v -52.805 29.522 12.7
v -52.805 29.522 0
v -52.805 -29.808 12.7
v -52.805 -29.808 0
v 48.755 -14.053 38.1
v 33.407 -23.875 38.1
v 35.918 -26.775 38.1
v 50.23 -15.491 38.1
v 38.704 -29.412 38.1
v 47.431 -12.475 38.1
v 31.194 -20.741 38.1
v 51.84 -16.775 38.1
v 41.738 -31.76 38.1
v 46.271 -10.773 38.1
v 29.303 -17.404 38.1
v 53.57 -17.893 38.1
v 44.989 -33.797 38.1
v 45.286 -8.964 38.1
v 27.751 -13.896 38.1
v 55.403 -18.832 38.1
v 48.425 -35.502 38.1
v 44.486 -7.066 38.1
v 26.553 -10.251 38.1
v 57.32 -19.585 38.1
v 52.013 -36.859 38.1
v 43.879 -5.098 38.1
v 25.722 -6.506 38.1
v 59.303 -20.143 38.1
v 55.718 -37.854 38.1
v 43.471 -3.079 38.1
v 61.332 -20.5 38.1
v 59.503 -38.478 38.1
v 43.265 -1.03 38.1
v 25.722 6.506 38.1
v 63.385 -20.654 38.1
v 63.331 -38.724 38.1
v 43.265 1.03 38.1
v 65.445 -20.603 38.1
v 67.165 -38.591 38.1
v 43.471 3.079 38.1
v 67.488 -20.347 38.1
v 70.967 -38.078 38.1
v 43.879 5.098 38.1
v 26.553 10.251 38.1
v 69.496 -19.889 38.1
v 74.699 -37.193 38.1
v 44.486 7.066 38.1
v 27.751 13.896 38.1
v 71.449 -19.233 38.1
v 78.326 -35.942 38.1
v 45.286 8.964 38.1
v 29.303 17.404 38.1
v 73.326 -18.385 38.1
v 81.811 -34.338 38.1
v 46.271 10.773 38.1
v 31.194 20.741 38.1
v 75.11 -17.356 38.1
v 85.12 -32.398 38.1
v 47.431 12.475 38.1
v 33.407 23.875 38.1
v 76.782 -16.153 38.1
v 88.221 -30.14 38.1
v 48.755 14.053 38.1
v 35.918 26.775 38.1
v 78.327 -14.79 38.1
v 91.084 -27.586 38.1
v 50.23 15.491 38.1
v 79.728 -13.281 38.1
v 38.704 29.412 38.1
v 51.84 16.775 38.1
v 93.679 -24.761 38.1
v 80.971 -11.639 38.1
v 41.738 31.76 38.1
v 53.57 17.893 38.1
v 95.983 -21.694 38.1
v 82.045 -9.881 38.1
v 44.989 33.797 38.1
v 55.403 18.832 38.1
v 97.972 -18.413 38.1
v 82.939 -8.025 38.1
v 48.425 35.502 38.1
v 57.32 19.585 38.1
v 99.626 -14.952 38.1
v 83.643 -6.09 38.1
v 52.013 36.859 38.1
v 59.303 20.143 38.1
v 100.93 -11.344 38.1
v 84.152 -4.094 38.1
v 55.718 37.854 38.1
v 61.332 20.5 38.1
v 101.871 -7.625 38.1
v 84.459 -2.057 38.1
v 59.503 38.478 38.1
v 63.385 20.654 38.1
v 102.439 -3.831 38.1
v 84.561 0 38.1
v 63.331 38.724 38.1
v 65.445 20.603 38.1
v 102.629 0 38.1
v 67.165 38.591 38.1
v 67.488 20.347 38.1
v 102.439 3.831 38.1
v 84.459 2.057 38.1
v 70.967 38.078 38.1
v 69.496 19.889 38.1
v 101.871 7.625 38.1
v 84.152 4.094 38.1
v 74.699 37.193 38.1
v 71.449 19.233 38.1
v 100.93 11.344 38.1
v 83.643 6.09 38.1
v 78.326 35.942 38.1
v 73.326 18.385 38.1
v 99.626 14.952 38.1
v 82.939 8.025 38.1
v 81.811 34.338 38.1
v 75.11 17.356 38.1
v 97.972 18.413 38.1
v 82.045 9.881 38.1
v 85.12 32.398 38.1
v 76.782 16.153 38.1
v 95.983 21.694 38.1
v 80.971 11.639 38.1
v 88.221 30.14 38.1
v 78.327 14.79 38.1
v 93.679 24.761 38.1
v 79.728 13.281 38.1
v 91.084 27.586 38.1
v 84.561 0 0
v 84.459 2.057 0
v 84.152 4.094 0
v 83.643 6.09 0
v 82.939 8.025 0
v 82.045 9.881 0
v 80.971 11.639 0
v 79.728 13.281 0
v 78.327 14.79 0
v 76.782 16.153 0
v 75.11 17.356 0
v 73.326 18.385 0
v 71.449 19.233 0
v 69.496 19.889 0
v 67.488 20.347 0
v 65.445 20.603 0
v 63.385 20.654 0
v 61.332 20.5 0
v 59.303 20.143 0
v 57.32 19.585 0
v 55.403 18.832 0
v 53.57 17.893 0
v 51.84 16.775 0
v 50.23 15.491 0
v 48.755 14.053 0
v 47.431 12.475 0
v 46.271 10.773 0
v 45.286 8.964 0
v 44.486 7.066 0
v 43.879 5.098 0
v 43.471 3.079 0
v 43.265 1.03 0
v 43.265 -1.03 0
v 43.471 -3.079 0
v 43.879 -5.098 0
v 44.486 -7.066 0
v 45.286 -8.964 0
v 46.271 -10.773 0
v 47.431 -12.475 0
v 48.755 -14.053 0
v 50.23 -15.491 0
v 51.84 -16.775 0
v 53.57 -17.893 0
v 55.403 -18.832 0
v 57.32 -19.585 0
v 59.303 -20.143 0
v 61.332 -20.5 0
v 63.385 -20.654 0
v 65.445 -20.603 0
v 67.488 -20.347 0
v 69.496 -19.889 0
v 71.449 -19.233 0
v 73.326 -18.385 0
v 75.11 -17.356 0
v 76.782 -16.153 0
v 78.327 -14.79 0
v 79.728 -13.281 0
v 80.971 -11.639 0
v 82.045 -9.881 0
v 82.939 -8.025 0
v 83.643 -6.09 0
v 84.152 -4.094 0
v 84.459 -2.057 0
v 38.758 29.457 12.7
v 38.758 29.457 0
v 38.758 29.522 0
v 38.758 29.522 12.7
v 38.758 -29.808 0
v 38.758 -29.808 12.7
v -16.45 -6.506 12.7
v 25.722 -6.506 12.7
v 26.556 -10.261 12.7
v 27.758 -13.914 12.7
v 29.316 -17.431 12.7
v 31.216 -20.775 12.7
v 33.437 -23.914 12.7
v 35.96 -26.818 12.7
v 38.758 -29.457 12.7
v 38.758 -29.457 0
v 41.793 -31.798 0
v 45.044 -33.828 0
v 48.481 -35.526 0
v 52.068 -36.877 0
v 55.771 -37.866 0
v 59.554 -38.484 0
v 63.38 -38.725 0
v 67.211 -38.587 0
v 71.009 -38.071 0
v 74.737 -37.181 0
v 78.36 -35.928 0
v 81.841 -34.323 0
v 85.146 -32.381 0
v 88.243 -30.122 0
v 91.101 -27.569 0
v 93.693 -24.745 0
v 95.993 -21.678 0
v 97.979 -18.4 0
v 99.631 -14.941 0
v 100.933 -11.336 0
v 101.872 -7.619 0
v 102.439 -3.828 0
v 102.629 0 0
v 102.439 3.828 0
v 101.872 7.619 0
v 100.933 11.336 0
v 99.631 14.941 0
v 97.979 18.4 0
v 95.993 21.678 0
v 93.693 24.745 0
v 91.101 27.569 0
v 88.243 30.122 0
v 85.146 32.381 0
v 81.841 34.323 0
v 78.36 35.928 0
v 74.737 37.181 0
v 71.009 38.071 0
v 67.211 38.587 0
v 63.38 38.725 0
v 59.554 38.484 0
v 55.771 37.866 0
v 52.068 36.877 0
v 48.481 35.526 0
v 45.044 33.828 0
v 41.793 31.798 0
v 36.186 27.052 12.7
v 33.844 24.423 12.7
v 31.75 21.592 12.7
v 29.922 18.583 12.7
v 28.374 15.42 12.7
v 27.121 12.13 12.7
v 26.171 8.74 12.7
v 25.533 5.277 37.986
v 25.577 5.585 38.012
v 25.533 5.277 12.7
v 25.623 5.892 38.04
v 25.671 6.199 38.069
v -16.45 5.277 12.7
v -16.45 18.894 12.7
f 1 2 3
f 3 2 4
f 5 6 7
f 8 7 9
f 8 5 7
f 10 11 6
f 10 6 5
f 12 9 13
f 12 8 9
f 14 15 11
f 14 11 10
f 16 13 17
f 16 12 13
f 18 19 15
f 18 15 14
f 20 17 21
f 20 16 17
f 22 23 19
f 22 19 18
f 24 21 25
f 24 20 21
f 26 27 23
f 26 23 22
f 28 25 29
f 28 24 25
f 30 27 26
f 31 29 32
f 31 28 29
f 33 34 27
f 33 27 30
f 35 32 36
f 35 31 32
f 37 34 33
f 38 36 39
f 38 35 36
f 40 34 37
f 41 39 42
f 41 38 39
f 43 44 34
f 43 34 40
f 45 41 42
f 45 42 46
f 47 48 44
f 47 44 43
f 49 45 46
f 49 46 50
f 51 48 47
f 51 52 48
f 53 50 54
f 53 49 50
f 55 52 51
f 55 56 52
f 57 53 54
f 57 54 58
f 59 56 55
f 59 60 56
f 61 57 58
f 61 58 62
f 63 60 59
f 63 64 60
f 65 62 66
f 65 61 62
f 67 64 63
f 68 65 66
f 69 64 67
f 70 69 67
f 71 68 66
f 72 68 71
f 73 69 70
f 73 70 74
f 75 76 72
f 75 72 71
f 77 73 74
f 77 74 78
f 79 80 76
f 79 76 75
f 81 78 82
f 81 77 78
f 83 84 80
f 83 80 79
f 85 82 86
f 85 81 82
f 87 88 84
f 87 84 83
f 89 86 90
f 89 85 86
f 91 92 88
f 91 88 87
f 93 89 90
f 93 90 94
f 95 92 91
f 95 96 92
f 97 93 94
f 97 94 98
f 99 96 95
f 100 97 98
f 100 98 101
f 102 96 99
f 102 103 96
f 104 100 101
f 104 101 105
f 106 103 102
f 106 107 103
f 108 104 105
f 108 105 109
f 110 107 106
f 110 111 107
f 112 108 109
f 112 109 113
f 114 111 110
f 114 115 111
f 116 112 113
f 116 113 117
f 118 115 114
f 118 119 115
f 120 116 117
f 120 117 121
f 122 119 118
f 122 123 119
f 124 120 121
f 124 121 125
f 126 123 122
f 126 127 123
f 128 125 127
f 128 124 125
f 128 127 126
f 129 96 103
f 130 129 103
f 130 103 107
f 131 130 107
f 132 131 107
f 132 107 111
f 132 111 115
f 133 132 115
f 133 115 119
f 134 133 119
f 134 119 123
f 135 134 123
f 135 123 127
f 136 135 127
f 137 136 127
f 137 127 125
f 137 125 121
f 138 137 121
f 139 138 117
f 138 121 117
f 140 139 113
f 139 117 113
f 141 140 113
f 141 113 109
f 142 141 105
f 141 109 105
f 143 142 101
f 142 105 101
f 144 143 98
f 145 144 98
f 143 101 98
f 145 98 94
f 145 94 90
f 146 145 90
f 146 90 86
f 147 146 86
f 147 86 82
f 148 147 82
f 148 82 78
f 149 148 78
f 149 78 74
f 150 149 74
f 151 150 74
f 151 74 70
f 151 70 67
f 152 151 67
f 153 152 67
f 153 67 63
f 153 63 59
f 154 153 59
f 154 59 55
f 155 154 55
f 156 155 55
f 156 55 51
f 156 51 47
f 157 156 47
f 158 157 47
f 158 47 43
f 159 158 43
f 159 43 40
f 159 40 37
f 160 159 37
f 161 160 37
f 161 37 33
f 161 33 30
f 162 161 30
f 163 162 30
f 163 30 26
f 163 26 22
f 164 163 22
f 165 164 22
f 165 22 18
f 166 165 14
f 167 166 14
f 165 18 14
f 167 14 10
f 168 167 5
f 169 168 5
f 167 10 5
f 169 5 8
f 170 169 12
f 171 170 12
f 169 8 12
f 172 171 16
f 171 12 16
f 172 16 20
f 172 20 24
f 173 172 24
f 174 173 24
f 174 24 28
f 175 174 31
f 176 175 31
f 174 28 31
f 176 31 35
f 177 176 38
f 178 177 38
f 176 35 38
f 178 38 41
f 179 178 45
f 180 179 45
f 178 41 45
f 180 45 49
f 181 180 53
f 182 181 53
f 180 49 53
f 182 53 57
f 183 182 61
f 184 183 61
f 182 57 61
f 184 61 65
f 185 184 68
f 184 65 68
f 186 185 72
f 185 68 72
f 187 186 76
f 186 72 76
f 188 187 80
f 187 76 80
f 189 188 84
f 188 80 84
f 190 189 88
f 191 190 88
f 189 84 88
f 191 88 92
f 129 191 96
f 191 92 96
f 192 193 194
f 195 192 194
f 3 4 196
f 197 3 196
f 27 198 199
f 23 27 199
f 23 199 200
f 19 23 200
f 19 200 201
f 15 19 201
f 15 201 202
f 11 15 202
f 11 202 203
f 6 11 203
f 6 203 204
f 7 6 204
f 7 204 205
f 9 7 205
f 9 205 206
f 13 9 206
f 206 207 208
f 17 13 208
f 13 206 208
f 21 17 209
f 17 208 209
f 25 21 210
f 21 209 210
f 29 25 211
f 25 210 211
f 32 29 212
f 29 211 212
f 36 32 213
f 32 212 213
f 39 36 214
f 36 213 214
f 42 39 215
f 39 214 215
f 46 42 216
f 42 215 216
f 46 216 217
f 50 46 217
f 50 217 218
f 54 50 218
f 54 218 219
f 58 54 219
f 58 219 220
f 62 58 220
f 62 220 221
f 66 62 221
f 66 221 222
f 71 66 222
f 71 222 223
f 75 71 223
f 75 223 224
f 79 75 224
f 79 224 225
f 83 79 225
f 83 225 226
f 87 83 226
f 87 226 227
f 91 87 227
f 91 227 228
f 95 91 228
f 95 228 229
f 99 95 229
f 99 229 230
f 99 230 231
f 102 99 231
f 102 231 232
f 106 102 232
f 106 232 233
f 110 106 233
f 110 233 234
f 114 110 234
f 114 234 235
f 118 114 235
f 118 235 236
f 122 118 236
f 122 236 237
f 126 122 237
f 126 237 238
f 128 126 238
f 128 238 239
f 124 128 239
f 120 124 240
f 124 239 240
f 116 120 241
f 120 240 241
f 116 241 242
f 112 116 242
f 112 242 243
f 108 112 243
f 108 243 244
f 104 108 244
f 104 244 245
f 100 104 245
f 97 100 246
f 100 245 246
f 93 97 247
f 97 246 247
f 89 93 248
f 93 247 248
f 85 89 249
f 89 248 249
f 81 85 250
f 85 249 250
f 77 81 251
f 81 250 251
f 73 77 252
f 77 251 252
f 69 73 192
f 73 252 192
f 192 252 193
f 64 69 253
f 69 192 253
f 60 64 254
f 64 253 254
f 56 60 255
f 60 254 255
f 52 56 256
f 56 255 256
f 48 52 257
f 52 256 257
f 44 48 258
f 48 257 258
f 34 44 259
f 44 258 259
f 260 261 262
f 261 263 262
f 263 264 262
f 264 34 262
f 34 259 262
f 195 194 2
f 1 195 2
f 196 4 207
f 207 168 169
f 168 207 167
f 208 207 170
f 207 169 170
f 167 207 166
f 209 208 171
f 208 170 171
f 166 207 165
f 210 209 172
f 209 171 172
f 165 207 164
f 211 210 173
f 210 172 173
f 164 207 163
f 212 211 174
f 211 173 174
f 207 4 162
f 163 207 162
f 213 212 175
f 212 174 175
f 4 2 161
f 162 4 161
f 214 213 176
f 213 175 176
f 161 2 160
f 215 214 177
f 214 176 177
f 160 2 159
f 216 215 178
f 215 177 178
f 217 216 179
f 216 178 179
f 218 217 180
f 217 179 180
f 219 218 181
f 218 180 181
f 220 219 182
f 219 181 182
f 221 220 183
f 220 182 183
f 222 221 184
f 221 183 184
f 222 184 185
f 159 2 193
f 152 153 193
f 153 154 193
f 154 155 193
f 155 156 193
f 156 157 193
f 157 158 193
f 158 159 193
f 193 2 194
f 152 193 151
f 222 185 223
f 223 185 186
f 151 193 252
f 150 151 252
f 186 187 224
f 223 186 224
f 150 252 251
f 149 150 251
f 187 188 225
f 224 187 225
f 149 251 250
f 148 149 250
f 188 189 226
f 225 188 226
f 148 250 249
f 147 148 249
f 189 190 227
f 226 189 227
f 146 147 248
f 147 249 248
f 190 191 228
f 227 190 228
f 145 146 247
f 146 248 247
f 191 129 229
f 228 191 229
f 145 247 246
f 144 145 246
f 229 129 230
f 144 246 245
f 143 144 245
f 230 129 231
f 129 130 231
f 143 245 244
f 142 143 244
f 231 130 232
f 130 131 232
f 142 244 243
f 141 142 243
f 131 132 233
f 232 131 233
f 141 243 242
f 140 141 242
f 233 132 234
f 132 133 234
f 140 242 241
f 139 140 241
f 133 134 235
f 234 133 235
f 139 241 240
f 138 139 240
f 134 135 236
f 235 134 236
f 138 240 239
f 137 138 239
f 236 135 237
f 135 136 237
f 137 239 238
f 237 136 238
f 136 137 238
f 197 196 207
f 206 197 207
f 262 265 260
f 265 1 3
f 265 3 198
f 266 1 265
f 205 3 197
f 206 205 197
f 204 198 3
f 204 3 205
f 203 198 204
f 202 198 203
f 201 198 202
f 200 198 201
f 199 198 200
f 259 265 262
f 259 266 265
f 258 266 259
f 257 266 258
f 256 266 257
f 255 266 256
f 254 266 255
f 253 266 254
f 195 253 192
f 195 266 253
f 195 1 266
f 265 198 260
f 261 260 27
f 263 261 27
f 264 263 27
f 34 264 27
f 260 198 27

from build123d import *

# Parameters (mm, degrees)
F1_DEPTH = 12.7
F2_R     = 38.728544
F3_DEPTH = 38.1
F4_W     = 42.172854
F4_H     = 11.782876
F5_DEPTH = 25.4
F7_DEPTH = 25.4
F8_R     = 20.660809
F9_DEPTH = 50.8


with BuildPart() as f1:
    # F0 (on Top) → F1 (new body)
    with BuildSketch(Plane.XY):
        with BuildLine():
            Line((38.757574, 29.522406), (-52.804671, 29.522406))
            Line((-52.804671, 29.522406), (-52.804671, -29.807648))
            Line((-52.804671, -29.807648), (38.757574, -29.807648))
            Line((38.757574, -29.807648), (38.757574, -29.413341))
            ThreePointArc((38.757574, -29.413341), (26.480182, 0), (38.757574, 29.413341))
            Line((38.757574, 29.413341), (38.757574, 29.522406))
        make_face()
    extrude(amount=F1_DEPTH)

    # F2 (on Top) → F3 (join)
    with BuildSketch(Plane.XY):
        with Locations((63.900545, 0)):
            Circle(F2_R)
    extrude(amount=F3_DEPTH)

    # F4 (on face) → F5 (join)
    with BuildSketch(Plane.XY.offset(12.7)):
        with Locations((4.635942, -0.614486)):
            Rectangle(F4_W, F4_H)
    extrude(amount=F5_DEPTH)

    # F6 (on face) → F7 (cut)
    with BuildSketch(Plane.XZ.offset(6.505924)):
        Polygon((-16.450485, 12.7), (25.722369, 38.1), (-16.450485, 38.1), align=None)
    extrude(amount=-F7_DEPTH, mode=Mode.SUBTRACT)

    # F8 (on face) → F9 (cut)
    with BuildSketch(Plane.XY.offset(38.1)):
        with Locations((63.900545, 0)):
            Circle(F8_R)
    extrude(amount=-F9_DEPTH, mode=Mode.SUBTRACT)


solid = f1.part
